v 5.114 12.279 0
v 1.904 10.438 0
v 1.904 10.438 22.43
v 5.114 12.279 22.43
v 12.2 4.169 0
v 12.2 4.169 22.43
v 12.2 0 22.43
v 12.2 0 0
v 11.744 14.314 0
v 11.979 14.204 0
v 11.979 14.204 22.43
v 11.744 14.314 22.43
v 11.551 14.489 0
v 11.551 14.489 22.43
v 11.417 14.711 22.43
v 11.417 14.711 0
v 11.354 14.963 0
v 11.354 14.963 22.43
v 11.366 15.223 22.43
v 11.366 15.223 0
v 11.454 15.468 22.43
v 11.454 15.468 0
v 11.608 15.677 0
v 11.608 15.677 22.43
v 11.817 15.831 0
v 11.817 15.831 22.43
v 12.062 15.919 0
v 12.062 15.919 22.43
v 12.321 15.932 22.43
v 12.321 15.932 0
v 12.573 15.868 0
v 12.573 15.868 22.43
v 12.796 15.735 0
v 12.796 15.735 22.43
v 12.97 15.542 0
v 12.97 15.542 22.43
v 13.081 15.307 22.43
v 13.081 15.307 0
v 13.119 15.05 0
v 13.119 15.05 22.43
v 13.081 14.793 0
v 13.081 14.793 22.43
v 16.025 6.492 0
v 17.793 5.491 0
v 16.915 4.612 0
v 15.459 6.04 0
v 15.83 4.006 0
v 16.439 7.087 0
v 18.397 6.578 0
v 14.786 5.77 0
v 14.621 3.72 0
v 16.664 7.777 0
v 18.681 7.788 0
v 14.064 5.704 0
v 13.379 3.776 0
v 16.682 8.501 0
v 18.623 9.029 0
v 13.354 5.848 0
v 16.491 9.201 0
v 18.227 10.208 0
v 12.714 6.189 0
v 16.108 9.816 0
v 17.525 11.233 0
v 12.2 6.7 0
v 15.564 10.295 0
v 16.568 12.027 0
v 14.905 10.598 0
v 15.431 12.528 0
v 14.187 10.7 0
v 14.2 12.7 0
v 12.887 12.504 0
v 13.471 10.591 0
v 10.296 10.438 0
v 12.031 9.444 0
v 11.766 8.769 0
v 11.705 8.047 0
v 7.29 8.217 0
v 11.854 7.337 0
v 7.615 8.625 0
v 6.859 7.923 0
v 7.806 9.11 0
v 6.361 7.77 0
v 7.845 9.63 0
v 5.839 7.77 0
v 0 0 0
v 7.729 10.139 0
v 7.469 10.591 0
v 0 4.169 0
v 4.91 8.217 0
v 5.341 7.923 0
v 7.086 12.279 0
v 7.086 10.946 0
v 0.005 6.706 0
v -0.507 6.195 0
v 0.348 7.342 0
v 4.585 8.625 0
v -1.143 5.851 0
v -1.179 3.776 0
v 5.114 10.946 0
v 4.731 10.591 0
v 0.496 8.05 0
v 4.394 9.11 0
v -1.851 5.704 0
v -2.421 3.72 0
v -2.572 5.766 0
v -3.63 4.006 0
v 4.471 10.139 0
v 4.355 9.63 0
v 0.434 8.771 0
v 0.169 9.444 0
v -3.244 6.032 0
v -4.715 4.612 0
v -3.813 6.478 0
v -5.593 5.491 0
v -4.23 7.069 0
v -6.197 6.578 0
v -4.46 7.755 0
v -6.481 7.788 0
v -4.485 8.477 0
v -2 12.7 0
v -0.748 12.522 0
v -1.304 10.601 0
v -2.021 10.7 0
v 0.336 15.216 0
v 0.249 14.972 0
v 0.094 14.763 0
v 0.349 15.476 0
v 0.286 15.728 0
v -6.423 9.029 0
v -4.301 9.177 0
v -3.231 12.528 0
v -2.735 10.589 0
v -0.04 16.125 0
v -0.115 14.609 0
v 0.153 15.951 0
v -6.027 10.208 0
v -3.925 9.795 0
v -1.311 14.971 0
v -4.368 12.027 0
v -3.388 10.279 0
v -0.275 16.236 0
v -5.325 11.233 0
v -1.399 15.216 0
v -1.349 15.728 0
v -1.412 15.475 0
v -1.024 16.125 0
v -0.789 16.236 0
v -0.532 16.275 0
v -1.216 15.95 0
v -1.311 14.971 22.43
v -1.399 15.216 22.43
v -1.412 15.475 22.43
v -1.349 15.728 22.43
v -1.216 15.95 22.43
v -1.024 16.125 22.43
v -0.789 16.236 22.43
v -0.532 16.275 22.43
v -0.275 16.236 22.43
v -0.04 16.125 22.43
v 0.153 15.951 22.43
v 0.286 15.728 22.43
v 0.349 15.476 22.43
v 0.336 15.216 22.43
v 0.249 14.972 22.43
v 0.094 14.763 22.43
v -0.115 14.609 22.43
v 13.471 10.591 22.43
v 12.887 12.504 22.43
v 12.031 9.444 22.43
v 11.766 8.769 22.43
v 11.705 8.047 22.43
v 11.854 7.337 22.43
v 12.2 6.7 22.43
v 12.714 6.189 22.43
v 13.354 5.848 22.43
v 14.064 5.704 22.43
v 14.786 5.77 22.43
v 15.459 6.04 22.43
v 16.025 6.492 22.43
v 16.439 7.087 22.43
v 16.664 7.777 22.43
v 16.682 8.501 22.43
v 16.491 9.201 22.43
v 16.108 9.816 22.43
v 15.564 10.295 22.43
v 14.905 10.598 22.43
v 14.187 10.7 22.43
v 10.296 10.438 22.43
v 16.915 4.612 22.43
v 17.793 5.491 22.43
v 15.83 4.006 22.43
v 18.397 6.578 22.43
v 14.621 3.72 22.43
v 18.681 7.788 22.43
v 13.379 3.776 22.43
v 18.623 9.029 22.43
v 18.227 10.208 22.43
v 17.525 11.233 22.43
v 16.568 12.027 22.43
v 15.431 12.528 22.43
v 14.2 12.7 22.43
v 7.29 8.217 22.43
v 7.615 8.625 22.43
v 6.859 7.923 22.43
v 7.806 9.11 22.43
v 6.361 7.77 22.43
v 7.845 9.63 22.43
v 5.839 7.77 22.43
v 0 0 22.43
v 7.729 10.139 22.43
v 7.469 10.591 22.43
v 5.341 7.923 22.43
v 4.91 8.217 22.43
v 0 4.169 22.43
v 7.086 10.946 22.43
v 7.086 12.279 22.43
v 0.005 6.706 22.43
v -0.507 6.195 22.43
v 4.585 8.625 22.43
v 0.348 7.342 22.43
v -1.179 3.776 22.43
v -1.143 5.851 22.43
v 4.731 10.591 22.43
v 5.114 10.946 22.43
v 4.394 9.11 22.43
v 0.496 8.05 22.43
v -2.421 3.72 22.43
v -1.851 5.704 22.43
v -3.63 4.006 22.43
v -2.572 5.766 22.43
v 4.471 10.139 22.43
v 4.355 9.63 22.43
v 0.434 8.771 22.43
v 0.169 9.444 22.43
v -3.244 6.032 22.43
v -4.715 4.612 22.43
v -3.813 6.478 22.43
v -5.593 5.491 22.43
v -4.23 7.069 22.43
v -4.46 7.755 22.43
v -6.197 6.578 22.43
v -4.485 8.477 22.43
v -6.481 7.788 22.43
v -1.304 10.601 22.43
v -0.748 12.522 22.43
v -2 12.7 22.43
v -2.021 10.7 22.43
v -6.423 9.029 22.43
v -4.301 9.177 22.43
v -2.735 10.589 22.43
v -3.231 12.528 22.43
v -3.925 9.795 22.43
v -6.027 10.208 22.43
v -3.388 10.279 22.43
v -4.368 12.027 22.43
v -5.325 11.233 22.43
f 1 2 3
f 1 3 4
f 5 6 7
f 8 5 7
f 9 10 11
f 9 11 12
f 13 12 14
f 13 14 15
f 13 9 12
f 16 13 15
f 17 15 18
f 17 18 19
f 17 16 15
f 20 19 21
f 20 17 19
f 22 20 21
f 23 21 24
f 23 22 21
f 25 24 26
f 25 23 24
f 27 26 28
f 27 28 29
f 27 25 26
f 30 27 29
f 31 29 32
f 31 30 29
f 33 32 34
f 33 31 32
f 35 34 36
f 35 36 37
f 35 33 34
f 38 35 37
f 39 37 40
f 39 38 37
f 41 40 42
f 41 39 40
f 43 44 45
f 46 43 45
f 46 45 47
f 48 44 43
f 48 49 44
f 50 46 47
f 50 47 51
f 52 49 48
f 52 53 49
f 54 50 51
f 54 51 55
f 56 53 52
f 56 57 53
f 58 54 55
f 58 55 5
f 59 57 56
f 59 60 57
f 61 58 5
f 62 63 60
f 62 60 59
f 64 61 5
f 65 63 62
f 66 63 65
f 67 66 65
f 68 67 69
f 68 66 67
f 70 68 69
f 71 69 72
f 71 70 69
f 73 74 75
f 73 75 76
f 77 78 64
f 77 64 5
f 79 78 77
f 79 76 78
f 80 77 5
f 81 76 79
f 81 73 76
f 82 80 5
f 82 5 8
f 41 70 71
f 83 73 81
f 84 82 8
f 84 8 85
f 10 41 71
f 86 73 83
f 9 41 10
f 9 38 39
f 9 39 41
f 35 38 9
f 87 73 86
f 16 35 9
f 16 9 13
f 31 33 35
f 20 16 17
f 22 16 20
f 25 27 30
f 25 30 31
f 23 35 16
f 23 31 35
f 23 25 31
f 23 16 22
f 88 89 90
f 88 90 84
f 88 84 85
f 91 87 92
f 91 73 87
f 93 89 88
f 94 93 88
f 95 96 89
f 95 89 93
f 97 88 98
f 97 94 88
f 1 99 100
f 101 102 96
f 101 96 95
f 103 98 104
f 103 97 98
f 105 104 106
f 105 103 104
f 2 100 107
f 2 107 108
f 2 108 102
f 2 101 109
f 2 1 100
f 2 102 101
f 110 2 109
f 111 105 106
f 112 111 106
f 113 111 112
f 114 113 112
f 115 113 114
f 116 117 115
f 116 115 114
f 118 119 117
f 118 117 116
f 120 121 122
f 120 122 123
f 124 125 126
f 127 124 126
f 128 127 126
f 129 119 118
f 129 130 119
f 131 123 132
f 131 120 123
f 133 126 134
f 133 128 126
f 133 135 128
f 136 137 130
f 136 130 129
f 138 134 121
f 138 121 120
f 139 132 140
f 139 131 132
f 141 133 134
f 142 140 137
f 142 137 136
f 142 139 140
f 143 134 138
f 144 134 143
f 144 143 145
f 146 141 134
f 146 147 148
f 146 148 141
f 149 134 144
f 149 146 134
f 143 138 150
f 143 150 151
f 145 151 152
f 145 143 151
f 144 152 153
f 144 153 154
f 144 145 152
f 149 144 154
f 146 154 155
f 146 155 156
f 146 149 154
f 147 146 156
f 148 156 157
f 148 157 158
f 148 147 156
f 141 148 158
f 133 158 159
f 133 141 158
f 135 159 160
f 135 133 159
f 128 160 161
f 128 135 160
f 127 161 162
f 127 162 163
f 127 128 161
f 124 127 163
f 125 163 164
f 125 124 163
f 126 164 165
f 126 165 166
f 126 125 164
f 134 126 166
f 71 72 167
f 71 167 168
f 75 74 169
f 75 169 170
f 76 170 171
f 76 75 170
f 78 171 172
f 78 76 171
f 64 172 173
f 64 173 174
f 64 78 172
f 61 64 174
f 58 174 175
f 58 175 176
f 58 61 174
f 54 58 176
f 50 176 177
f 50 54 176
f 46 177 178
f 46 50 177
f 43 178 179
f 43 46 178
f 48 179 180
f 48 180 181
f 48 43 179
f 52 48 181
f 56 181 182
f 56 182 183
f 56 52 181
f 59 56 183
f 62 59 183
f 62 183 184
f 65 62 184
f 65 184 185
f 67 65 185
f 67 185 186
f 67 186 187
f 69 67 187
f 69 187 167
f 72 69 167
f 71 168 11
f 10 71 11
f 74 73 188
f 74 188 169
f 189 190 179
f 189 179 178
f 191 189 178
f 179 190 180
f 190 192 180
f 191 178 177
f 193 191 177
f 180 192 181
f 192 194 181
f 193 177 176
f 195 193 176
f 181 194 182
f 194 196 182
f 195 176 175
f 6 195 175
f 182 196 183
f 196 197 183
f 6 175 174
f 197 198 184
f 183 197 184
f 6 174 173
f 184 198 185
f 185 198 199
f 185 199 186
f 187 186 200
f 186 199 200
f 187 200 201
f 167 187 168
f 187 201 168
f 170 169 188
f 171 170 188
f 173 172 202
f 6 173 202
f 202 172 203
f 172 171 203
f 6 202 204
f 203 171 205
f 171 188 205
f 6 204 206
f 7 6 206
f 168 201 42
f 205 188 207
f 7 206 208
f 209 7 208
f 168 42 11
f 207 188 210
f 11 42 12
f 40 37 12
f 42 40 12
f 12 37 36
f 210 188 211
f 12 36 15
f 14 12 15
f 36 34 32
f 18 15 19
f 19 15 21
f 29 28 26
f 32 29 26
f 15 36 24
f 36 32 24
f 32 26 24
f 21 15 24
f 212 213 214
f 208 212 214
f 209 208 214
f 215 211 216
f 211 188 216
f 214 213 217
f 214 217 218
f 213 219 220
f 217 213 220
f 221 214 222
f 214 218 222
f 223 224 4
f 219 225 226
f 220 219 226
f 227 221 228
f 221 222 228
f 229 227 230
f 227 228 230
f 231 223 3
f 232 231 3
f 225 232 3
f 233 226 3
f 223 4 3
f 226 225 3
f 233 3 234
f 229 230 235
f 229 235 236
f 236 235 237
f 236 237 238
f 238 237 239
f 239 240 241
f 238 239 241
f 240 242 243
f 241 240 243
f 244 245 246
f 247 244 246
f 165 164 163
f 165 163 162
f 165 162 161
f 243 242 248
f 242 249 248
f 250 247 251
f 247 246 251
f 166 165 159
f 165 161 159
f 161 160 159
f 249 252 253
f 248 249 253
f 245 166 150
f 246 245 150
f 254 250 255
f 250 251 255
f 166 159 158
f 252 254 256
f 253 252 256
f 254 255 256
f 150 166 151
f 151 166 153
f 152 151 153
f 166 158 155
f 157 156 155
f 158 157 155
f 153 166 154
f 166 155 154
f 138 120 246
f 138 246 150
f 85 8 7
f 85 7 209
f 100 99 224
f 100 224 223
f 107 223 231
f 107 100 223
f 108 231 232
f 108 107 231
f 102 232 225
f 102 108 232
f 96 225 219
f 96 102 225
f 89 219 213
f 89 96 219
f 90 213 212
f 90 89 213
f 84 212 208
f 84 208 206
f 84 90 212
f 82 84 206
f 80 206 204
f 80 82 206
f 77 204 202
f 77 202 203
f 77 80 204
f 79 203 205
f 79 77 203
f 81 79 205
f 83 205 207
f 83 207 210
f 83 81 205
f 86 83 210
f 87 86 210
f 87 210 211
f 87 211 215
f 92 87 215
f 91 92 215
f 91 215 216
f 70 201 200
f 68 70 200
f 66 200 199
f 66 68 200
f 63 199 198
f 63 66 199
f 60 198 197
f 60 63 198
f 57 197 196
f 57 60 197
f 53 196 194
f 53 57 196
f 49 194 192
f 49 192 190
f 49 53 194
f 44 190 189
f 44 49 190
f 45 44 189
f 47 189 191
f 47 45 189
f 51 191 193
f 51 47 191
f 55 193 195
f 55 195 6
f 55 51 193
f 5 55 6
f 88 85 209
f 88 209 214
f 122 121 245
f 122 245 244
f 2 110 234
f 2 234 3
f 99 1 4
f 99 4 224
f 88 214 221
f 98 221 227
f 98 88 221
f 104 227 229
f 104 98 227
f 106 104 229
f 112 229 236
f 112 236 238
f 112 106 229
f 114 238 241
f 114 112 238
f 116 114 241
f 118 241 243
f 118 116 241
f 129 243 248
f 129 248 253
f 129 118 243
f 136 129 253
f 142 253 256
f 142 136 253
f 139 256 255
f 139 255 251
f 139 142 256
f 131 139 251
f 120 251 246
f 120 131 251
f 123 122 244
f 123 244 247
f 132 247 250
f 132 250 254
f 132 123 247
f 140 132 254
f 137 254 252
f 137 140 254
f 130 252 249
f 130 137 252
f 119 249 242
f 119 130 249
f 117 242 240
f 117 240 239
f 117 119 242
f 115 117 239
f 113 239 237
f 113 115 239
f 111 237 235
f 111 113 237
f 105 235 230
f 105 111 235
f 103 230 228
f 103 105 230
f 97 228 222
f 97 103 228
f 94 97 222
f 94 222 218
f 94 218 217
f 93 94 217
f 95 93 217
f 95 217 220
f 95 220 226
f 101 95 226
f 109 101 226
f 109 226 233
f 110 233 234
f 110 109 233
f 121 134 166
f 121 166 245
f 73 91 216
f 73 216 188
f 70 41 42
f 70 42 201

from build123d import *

# Parameters (mm, degrees)
Y_KSEKLIK_EKSTR_ZYON1_DEPTH = 22.43


with BuildPart() as part:
    # Çizim1 → Yükseklik-Ekstrüzyon1 (new body)
    with BuildSketch(Plane.XY):
        with BuildLine():
            ThreePointArc((5.113608786, 10.945521488), (6.1, 7.75), (7.086391214, 10.945521488))
            Line((7.086391214, 10.945521488), (7.086391214, 12.27879517))
            Line((7.086391214, 12.27879517), (10.2961903, 10.438363203))
            Line((10.2961903, 10.438363203), (12.031216834, 9.443535113))
            ThreePointArc((12.031216834, 9.443535113), (15.758549535, 6.245281773), (13.470670658, 10.591250449))
            Line((13.470670658, 10.591250449), (12.887207184, 12.504250808))
            Line((12.887207184, 12.504250808), (11.978588262, 14.203649507))
            ThreePointArc((11.978588262, 14.203649507), (11.817033945, 15.831345203), (13.080916647, 14.793032346))
            Line((13.080916647, 14.793032346), (14.2, 12.7))
            ThreePointArc((14.2, 12.7), (18.58121444, 7.172887527), (12.2, 4.168871126))
            Line((12.2, 4.168871126), (12.2, 0))
            Line((12.2, 0), (0, 0))
            Line((0, 0), (0, 4.168871126))
            ThreePointArc((0, 4.168871126), (-6.38121444, 7.172887527), (-2, 12.7))
            Line((-2, 12.7), (-1.311314062, 14.971308793))
            ThreePointArc((-1.311314062, 14.971308793), (-0.274595552, 16.23649961), (-0.115093584, 14.608601518))
            Line((-0.115093584, 14.608601518), (-0.747701793, 12.522238911))
            Line((-0.747701793, 12.522238911), (-1.304278774, 10.601243839))
            ThreePointArc((-1.304278774, 10.601243839), (-3.544803783, 6.234400531), (0.168783166, 9.443535113))
            Line((0.168783166, 9.443535113), (1.9038097, 10.438363203))
            Line((1.9038097, 10.438363203), (5.113608786, 12.27879517))
            Line((5.113608786, 12.27879517), (5.113608786, 10.945521488))
        make_face()
    extrude(amount=Y_KSEKLIK_EKSTR_ZYON1_DEPTH)


solid = part.part
